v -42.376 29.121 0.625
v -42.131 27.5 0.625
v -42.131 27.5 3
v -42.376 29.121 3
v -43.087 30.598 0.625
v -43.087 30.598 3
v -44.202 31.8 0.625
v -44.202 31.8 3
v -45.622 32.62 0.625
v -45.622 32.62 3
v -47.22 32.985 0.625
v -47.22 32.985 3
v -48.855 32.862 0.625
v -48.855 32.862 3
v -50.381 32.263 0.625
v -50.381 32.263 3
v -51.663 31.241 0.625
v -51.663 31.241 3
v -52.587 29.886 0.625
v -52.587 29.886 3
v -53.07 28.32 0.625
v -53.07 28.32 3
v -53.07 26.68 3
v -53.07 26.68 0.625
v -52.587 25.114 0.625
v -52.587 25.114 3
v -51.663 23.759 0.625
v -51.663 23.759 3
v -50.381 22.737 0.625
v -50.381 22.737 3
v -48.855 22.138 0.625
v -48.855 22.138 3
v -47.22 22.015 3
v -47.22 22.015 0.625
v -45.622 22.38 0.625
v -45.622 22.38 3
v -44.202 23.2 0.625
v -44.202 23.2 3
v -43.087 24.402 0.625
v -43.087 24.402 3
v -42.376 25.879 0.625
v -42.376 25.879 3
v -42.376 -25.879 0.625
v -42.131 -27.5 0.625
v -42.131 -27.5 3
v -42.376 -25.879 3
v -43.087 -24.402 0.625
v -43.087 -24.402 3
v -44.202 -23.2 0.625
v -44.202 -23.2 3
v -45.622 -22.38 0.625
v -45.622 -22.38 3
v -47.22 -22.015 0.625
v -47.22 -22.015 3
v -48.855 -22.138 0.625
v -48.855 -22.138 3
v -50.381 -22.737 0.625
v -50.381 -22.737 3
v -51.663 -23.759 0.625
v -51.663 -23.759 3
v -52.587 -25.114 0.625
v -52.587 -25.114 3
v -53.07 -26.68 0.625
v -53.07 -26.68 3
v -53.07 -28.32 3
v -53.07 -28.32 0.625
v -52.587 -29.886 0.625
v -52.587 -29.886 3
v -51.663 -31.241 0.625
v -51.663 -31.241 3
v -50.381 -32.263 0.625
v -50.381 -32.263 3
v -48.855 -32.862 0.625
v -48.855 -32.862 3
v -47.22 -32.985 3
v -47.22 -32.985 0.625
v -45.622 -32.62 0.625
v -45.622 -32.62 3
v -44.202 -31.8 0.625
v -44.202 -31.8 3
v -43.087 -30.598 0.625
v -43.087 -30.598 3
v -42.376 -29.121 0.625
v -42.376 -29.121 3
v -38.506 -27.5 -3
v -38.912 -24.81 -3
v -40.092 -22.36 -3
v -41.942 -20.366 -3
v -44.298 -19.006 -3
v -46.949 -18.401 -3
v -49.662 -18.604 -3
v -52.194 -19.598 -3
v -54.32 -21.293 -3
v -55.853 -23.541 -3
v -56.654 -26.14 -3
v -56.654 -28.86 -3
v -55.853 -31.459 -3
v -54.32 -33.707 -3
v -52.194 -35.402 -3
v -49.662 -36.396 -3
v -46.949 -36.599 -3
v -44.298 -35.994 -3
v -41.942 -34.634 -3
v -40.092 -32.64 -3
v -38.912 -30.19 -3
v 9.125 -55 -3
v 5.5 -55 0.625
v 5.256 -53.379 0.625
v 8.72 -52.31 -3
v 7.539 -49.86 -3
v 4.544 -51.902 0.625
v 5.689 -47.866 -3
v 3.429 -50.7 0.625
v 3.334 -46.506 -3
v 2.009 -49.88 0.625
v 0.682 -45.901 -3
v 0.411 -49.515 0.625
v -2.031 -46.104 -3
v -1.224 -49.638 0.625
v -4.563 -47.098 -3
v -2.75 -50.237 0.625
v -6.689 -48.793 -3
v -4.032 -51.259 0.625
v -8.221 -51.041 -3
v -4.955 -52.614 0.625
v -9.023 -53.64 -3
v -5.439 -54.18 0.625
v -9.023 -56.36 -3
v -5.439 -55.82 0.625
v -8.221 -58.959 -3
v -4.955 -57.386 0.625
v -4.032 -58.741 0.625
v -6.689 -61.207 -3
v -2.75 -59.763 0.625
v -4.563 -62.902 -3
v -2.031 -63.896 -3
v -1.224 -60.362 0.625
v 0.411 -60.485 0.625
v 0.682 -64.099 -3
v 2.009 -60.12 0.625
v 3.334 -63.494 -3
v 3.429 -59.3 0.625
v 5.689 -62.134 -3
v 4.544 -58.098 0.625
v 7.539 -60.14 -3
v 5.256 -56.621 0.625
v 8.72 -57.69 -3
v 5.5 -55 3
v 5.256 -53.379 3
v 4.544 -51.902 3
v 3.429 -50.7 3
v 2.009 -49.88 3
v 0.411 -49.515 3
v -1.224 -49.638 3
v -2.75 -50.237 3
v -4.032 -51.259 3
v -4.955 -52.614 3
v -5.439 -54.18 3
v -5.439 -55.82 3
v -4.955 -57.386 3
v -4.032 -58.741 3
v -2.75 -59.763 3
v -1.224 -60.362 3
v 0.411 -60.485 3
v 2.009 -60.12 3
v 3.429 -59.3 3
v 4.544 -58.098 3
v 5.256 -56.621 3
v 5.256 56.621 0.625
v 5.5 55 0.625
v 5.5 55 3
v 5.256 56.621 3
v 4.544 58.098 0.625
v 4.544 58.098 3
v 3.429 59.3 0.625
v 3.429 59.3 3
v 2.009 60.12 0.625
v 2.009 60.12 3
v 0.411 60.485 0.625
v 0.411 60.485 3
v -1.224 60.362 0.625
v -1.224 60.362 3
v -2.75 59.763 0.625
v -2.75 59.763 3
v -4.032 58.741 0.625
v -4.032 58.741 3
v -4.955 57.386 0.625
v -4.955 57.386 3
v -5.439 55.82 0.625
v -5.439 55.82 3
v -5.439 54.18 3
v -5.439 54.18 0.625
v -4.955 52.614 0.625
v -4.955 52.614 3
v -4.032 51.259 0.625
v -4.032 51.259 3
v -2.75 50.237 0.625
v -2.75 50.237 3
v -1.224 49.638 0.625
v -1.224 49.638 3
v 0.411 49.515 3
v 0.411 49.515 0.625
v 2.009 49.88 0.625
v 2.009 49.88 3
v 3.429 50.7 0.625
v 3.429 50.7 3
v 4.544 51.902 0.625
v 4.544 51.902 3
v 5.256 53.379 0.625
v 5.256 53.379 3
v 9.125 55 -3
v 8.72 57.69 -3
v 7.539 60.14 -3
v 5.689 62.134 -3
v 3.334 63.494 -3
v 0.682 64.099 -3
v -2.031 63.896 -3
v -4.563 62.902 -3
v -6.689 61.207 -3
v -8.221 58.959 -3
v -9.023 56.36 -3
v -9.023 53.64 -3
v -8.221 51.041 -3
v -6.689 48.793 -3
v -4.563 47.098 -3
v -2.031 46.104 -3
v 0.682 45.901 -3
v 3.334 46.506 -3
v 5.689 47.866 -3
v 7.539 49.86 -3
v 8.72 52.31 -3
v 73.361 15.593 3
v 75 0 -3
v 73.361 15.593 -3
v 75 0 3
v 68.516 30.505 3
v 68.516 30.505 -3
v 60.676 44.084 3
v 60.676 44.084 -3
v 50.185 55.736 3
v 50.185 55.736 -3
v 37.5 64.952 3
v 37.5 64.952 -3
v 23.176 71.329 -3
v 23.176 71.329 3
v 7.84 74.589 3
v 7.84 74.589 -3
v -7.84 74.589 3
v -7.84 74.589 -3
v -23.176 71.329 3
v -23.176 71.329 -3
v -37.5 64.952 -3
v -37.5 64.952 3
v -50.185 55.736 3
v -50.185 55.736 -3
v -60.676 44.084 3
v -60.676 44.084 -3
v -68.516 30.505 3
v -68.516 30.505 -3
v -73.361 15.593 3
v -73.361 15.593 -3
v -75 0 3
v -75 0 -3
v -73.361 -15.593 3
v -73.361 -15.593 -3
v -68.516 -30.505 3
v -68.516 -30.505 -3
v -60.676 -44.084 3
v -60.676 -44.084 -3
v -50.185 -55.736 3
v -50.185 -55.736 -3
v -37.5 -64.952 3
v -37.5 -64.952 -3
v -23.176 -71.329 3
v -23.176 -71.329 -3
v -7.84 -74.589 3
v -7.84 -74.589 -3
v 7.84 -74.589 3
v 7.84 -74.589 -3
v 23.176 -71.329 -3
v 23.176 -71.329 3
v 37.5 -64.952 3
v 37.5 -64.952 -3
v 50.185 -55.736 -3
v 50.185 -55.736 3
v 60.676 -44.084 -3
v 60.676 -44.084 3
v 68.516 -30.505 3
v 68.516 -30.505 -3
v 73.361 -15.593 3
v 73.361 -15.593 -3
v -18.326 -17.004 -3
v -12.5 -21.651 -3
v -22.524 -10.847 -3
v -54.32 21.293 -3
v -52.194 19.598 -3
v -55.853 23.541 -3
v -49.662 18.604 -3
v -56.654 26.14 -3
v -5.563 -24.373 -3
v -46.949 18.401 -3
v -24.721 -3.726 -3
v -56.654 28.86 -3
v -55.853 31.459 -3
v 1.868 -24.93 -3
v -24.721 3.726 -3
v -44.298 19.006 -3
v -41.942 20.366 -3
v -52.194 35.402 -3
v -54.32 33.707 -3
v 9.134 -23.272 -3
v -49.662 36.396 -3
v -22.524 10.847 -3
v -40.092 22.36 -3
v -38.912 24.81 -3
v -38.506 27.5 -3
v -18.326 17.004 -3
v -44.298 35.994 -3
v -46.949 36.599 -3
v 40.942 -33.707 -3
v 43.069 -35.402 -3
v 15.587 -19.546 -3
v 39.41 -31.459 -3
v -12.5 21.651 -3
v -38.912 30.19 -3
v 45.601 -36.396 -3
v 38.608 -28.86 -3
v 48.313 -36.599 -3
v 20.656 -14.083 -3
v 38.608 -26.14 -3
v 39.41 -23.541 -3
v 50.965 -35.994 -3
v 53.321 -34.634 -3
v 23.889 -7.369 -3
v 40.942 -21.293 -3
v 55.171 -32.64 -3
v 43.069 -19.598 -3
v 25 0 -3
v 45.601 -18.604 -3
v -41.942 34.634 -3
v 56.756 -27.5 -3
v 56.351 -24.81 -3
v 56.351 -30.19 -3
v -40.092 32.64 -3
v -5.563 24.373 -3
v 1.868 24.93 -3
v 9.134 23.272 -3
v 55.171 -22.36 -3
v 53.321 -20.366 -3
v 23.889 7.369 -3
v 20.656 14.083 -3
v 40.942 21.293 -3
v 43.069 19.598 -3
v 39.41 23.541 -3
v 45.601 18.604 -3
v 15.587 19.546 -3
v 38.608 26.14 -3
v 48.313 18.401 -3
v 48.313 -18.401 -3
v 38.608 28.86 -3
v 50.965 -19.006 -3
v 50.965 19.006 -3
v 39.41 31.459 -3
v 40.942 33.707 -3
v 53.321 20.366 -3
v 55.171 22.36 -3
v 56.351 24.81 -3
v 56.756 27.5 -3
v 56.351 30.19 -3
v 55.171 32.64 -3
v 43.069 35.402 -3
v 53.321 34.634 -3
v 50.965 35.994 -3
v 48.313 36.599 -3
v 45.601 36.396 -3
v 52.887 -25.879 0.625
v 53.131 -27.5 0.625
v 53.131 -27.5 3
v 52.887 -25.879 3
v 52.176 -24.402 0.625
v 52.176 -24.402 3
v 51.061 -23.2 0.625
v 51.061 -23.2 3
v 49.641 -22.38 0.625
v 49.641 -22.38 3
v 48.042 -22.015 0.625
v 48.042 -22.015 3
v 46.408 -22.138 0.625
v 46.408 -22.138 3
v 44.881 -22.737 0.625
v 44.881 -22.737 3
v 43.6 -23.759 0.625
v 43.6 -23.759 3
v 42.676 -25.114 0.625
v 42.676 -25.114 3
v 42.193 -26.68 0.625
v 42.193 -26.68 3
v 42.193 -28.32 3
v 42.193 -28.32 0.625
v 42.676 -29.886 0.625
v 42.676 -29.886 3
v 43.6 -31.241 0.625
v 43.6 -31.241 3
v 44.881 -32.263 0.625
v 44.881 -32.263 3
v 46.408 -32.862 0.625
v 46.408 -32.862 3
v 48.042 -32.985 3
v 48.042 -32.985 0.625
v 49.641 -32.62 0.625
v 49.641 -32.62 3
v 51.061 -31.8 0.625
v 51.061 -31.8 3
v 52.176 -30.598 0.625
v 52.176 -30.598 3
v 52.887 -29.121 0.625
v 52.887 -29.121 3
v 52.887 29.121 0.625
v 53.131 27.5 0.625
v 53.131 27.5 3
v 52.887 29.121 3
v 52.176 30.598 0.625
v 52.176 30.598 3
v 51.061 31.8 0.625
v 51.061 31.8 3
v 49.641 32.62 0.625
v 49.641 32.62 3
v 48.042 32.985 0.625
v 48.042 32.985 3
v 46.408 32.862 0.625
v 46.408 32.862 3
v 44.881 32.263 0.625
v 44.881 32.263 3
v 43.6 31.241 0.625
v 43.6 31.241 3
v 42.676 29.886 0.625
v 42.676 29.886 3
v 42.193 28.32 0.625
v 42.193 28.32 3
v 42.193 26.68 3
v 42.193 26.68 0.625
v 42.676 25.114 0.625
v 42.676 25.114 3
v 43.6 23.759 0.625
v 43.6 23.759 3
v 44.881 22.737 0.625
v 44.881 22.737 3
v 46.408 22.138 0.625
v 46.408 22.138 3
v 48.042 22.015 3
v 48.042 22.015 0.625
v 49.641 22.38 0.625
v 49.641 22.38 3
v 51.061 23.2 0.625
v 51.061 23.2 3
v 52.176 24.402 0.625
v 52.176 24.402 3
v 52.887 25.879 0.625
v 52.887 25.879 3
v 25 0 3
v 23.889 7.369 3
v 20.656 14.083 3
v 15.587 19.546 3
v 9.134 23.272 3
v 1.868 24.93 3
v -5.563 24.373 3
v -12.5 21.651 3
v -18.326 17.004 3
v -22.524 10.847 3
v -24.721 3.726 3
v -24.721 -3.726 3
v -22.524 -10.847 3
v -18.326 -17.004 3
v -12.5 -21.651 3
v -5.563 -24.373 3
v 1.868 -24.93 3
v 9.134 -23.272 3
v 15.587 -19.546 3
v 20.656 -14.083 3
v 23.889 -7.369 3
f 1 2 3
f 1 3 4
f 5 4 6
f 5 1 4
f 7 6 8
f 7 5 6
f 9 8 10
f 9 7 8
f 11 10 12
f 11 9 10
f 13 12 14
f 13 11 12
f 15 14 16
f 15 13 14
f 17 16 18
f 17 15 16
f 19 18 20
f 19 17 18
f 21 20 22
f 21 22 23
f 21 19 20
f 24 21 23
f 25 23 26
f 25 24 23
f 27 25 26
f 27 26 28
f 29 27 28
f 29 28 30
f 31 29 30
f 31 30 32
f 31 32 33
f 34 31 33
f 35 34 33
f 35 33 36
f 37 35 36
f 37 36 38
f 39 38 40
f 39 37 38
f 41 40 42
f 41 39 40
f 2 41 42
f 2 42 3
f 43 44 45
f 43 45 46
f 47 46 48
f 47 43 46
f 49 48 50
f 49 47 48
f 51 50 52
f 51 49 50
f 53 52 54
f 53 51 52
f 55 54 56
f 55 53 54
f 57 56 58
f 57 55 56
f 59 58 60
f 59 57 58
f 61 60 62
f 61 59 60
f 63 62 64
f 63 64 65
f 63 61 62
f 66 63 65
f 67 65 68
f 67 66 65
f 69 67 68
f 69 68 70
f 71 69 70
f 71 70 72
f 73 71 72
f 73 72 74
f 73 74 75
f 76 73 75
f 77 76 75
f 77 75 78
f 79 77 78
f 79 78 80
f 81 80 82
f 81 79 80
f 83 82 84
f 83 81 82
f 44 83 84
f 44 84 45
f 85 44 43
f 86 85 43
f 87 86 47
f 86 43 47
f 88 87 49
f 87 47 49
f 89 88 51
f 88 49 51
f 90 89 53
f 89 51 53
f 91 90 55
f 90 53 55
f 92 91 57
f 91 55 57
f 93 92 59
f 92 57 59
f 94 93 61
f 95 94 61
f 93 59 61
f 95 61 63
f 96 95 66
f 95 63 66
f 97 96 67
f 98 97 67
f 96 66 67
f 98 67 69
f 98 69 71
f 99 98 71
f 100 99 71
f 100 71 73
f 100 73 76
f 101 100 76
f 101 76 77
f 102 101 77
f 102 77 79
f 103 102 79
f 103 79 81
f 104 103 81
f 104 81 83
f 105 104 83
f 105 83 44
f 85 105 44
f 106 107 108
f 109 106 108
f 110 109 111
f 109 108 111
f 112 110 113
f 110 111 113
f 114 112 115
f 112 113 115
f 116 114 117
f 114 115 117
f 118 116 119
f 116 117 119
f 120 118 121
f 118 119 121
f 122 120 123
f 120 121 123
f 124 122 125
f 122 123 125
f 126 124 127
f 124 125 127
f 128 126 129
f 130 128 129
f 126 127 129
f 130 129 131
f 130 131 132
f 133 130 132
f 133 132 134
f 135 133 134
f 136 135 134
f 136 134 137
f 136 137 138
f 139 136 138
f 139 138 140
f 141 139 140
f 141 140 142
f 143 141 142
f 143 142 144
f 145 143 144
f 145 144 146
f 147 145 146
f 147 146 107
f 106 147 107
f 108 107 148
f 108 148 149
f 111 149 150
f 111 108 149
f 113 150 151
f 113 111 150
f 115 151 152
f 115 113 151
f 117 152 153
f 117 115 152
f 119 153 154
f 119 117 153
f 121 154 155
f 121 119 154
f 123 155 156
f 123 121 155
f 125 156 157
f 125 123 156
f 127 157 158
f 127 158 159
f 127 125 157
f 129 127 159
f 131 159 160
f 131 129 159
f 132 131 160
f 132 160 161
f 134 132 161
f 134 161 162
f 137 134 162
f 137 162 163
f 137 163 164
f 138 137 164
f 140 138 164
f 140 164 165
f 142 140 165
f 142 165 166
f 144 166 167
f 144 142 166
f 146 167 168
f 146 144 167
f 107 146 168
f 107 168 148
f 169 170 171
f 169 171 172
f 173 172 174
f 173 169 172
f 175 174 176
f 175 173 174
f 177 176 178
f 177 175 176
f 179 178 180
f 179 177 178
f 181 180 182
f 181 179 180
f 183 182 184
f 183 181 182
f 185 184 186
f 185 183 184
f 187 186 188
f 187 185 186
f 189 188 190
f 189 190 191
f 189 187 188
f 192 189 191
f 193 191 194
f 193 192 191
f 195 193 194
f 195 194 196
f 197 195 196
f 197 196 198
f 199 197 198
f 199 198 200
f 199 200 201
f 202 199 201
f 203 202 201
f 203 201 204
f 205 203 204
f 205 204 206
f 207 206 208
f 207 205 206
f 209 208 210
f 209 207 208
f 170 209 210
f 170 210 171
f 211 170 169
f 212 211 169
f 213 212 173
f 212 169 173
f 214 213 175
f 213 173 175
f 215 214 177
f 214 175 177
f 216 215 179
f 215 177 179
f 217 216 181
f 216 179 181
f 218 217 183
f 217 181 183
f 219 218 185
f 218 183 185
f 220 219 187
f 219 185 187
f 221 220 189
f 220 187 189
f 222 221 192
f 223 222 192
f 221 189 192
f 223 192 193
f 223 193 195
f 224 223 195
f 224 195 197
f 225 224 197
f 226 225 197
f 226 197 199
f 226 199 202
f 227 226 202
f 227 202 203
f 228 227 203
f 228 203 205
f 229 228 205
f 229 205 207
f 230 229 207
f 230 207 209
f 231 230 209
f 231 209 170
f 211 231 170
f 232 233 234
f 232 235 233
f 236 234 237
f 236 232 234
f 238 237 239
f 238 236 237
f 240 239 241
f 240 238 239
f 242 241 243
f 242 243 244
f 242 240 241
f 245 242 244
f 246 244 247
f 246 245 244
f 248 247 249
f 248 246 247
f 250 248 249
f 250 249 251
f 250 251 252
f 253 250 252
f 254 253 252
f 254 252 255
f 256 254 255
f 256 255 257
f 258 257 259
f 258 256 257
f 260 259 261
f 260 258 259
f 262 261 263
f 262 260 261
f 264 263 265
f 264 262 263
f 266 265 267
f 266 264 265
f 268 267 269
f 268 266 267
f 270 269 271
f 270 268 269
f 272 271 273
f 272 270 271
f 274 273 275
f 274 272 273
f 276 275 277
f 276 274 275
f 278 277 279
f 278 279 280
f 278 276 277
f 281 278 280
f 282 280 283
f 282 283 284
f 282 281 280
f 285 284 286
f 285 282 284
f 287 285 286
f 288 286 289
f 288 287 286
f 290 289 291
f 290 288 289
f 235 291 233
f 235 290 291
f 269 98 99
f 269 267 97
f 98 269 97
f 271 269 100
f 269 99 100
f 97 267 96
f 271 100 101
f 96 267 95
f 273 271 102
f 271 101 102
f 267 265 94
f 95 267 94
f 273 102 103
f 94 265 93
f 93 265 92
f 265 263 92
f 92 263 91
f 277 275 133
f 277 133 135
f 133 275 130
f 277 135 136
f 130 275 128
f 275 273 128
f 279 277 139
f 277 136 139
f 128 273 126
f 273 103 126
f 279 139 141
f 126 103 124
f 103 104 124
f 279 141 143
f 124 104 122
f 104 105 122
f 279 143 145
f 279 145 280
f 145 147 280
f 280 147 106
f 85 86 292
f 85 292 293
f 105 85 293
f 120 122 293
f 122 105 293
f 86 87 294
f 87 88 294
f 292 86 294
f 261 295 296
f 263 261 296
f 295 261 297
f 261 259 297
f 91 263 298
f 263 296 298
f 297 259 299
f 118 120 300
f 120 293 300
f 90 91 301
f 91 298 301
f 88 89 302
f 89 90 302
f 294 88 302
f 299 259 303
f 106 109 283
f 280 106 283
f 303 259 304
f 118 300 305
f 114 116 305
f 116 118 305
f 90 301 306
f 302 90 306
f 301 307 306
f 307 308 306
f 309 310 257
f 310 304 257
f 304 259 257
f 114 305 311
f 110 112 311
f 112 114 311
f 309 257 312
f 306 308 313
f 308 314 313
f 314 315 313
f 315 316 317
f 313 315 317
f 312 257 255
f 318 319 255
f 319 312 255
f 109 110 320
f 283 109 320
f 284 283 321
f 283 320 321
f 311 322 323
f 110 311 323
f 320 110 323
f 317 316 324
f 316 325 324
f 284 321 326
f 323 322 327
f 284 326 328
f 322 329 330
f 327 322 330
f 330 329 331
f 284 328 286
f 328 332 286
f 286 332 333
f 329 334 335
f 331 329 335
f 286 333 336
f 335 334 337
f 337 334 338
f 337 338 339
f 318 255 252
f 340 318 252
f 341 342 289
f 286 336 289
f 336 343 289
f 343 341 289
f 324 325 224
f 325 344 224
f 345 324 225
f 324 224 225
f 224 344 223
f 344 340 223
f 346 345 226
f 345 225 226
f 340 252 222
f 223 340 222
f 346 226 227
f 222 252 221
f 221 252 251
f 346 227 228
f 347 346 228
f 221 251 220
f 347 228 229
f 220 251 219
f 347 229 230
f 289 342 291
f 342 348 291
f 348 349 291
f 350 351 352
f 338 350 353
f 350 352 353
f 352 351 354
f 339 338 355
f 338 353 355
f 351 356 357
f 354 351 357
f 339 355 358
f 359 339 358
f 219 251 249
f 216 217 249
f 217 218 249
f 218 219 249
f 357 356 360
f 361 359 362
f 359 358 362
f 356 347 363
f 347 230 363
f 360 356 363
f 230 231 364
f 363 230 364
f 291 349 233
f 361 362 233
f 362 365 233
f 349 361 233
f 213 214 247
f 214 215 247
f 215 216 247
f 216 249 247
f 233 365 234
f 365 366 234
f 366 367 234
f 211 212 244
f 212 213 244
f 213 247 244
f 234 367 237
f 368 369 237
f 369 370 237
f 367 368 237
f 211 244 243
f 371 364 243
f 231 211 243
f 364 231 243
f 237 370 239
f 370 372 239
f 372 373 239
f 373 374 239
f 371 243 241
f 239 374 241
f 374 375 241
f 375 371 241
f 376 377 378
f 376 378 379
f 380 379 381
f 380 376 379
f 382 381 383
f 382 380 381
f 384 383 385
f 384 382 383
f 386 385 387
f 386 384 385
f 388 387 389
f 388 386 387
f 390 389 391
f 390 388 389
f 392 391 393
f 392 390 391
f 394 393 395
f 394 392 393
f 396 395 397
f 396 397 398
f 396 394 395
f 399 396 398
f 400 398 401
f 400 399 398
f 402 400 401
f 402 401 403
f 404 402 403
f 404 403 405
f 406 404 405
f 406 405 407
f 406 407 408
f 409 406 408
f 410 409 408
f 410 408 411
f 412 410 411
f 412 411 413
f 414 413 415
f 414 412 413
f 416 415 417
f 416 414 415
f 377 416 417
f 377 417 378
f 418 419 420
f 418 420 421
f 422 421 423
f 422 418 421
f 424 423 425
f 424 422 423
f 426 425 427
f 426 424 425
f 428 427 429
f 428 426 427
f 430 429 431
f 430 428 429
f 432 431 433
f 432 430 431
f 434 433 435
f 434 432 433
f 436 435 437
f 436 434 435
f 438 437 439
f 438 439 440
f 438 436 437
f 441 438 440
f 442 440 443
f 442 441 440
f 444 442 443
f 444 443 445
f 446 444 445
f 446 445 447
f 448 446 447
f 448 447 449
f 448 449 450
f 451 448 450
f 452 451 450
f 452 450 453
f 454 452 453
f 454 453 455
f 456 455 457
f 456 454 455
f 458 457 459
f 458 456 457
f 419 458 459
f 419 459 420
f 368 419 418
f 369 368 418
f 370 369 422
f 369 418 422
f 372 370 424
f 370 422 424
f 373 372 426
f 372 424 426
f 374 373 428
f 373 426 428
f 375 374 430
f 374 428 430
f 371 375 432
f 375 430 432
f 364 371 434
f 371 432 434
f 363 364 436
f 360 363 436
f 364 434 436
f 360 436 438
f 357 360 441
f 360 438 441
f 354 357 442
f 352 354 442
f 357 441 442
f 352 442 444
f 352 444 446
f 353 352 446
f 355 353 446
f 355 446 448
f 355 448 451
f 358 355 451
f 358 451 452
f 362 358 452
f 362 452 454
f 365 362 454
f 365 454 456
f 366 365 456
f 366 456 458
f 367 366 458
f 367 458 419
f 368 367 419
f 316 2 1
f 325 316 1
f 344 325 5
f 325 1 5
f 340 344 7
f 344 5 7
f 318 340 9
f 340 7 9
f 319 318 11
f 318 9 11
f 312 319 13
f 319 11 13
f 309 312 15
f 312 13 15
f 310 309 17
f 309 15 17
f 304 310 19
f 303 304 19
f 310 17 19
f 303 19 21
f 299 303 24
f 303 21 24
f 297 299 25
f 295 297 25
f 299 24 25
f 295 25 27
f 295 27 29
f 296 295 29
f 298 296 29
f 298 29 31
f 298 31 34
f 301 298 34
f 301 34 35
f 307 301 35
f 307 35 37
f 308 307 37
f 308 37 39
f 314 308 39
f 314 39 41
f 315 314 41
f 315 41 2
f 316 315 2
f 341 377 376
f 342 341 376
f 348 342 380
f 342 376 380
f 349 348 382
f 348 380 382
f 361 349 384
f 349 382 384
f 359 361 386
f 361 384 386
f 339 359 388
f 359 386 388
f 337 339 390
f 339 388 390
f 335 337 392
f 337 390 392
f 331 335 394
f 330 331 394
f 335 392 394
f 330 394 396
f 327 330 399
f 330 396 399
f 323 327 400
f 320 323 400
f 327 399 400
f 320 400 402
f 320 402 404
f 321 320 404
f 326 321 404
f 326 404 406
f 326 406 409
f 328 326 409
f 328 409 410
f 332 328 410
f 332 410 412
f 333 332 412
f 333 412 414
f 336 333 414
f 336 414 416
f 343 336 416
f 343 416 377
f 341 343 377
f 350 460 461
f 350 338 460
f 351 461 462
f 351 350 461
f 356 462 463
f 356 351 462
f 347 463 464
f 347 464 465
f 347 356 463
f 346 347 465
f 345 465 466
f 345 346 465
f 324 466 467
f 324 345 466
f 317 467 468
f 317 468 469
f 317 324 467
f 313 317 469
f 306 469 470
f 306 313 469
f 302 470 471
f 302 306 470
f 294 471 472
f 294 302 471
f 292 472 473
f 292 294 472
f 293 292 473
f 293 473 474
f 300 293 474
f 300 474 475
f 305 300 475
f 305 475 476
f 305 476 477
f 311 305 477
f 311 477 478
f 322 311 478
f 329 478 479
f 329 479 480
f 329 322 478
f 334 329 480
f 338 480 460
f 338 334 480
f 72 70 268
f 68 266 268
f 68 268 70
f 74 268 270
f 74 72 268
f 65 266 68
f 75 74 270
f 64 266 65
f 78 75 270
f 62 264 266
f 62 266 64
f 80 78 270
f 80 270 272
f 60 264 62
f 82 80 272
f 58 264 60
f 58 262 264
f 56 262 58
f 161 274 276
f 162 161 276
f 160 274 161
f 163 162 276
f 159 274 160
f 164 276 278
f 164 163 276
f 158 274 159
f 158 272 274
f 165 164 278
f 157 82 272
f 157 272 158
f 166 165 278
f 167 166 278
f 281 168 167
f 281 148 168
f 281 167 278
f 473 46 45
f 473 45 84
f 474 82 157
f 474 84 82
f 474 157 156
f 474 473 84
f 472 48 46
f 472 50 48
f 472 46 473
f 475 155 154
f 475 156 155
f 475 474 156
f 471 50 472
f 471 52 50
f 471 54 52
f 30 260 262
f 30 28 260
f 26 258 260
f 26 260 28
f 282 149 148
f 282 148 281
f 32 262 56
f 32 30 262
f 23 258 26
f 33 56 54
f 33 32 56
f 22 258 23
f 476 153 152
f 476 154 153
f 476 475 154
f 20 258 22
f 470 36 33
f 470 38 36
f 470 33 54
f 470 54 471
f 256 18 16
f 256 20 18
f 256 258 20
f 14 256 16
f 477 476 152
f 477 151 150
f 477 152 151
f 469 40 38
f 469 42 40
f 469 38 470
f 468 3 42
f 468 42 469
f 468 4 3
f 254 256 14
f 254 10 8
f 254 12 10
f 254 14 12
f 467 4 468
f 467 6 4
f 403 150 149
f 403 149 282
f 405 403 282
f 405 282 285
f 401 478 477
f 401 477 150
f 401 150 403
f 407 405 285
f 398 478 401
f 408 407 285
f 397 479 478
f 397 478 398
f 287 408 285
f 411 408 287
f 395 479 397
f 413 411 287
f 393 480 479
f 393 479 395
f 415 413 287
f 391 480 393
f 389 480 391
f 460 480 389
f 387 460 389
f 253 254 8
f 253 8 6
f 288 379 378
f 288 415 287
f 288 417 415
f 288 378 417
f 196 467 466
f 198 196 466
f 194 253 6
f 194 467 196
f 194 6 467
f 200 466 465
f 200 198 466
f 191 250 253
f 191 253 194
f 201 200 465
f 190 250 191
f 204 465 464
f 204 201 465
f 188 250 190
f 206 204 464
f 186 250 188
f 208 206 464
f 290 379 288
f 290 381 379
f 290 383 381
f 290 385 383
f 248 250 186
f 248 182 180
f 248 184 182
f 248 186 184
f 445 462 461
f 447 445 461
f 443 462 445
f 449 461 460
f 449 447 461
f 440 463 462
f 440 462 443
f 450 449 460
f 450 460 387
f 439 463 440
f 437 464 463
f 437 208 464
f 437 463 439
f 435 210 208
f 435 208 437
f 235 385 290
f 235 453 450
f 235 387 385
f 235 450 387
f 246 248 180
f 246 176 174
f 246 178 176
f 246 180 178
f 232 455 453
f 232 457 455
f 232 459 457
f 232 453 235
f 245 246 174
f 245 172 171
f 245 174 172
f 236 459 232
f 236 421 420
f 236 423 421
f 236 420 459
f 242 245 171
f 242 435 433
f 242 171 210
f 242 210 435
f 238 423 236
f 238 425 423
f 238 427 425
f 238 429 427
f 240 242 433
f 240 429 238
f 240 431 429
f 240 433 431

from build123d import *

# Parameters (mm, degrees)
SKETCH_1_R                  = 75
SKETCH_1_R_2                = 25
SKETCH_1_R_3                = 5.5
EXTRUDE_1_DEPTH             = 3
HOLE_WIZARD_M81_D           = 9
HOLE_WIZARD_M81_DEPTH       = 17
HOLE_WIZARD_M81_CSINK_D     = 18.25
HOLE_WIZARD_M81_CSINK_ANGLE = 90
HOLE_WIZARD_M81_TIP         = 2.703872786


with BuildPart() as part:
    # Эскиз1 → Бобышка-Вытянуть1 (new, symmetric)
    with BuildSketch(Plane.XY):
        Circle(SKETCH_1_R)
        Circle(SKETCH_1_R_2, mode=Mode.SUBTRACT)
        with Locations((0, 55)):
            Circle(SKETCH_1_R_3, mode=Mode.SUBTRACT)
        with Locations((47.631397208, 27.5)):
            Circle(SKETCH_1_R_3, mode=Mode.SUBTRACT)
        with Locations((47.631397208, -27.5)):
            Circle(SKETCH_1_R_3, mode=Mode.SUBTRACT)
        with Locations((0, -55)):
            Circle(SKETCH_1_R_3, mode=Mode.SUBTRACT)
        with Locations((-47.631397208, -27.5)):
            Circle(SKETCH_1_R_3, mode=Mode.SUBTRACT)
        with Locations((-47.631397208, 27.5)):
            Circle(SKETCH_1_R_3, mode=Mode.SUBTRACT)
    extrude(amount=EXTRUDE_1_DEPTH, both=True)

    # Зенковка для винта с потайной головкой и внутренним шестигранником M81
    with Locations(Plane(origin=(0, 0, -3), x_dir=(-1, 0, 0), z_dir=(0, 0, -1))):
        with Locations((0, 55), (47.631397208, 27.5), (47.631397208, -27.5), (0, -55), (-47.631397208, -27.5), (-47.631397208, 27.5)):
            CounterSinkHole(HOLE_WIZARD_M81_D / 2, HOLE_WIZARD_M81_CSINK_D / 2, depth=HOLE_WIZARD_M81_DEPTH, counter_sink_angle=HOLE_WIZARD_M81_CSINK_ANGLE)
            with Locations((0, 0, -(HOLE_WIZARD_M81_DEPTH + HOLE_WIZARD_M81_TIP / 2))):  # 118° drill point
                Cone(0, HOLE_WIZARD_M81_D / 2, HOLE_WIZARD_M81_TIP, mode=Mode.SUBTRACT)


solid = part.part
